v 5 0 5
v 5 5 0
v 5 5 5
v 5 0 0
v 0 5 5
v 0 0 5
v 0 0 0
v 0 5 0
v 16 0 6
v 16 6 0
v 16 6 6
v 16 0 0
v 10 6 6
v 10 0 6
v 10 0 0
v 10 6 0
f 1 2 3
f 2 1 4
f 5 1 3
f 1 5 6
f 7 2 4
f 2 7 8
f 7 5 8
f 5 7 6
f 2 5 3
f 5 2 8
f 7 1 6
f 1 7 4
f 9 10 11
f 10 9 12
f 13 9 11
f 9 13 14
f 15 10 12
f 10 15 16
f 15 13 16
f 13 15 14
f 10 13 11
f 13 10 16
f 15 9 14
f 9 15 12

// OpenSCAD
color("a&b<c>\"d") cube(5);
translate([10,0,0]) color("ünï") cube(6);
